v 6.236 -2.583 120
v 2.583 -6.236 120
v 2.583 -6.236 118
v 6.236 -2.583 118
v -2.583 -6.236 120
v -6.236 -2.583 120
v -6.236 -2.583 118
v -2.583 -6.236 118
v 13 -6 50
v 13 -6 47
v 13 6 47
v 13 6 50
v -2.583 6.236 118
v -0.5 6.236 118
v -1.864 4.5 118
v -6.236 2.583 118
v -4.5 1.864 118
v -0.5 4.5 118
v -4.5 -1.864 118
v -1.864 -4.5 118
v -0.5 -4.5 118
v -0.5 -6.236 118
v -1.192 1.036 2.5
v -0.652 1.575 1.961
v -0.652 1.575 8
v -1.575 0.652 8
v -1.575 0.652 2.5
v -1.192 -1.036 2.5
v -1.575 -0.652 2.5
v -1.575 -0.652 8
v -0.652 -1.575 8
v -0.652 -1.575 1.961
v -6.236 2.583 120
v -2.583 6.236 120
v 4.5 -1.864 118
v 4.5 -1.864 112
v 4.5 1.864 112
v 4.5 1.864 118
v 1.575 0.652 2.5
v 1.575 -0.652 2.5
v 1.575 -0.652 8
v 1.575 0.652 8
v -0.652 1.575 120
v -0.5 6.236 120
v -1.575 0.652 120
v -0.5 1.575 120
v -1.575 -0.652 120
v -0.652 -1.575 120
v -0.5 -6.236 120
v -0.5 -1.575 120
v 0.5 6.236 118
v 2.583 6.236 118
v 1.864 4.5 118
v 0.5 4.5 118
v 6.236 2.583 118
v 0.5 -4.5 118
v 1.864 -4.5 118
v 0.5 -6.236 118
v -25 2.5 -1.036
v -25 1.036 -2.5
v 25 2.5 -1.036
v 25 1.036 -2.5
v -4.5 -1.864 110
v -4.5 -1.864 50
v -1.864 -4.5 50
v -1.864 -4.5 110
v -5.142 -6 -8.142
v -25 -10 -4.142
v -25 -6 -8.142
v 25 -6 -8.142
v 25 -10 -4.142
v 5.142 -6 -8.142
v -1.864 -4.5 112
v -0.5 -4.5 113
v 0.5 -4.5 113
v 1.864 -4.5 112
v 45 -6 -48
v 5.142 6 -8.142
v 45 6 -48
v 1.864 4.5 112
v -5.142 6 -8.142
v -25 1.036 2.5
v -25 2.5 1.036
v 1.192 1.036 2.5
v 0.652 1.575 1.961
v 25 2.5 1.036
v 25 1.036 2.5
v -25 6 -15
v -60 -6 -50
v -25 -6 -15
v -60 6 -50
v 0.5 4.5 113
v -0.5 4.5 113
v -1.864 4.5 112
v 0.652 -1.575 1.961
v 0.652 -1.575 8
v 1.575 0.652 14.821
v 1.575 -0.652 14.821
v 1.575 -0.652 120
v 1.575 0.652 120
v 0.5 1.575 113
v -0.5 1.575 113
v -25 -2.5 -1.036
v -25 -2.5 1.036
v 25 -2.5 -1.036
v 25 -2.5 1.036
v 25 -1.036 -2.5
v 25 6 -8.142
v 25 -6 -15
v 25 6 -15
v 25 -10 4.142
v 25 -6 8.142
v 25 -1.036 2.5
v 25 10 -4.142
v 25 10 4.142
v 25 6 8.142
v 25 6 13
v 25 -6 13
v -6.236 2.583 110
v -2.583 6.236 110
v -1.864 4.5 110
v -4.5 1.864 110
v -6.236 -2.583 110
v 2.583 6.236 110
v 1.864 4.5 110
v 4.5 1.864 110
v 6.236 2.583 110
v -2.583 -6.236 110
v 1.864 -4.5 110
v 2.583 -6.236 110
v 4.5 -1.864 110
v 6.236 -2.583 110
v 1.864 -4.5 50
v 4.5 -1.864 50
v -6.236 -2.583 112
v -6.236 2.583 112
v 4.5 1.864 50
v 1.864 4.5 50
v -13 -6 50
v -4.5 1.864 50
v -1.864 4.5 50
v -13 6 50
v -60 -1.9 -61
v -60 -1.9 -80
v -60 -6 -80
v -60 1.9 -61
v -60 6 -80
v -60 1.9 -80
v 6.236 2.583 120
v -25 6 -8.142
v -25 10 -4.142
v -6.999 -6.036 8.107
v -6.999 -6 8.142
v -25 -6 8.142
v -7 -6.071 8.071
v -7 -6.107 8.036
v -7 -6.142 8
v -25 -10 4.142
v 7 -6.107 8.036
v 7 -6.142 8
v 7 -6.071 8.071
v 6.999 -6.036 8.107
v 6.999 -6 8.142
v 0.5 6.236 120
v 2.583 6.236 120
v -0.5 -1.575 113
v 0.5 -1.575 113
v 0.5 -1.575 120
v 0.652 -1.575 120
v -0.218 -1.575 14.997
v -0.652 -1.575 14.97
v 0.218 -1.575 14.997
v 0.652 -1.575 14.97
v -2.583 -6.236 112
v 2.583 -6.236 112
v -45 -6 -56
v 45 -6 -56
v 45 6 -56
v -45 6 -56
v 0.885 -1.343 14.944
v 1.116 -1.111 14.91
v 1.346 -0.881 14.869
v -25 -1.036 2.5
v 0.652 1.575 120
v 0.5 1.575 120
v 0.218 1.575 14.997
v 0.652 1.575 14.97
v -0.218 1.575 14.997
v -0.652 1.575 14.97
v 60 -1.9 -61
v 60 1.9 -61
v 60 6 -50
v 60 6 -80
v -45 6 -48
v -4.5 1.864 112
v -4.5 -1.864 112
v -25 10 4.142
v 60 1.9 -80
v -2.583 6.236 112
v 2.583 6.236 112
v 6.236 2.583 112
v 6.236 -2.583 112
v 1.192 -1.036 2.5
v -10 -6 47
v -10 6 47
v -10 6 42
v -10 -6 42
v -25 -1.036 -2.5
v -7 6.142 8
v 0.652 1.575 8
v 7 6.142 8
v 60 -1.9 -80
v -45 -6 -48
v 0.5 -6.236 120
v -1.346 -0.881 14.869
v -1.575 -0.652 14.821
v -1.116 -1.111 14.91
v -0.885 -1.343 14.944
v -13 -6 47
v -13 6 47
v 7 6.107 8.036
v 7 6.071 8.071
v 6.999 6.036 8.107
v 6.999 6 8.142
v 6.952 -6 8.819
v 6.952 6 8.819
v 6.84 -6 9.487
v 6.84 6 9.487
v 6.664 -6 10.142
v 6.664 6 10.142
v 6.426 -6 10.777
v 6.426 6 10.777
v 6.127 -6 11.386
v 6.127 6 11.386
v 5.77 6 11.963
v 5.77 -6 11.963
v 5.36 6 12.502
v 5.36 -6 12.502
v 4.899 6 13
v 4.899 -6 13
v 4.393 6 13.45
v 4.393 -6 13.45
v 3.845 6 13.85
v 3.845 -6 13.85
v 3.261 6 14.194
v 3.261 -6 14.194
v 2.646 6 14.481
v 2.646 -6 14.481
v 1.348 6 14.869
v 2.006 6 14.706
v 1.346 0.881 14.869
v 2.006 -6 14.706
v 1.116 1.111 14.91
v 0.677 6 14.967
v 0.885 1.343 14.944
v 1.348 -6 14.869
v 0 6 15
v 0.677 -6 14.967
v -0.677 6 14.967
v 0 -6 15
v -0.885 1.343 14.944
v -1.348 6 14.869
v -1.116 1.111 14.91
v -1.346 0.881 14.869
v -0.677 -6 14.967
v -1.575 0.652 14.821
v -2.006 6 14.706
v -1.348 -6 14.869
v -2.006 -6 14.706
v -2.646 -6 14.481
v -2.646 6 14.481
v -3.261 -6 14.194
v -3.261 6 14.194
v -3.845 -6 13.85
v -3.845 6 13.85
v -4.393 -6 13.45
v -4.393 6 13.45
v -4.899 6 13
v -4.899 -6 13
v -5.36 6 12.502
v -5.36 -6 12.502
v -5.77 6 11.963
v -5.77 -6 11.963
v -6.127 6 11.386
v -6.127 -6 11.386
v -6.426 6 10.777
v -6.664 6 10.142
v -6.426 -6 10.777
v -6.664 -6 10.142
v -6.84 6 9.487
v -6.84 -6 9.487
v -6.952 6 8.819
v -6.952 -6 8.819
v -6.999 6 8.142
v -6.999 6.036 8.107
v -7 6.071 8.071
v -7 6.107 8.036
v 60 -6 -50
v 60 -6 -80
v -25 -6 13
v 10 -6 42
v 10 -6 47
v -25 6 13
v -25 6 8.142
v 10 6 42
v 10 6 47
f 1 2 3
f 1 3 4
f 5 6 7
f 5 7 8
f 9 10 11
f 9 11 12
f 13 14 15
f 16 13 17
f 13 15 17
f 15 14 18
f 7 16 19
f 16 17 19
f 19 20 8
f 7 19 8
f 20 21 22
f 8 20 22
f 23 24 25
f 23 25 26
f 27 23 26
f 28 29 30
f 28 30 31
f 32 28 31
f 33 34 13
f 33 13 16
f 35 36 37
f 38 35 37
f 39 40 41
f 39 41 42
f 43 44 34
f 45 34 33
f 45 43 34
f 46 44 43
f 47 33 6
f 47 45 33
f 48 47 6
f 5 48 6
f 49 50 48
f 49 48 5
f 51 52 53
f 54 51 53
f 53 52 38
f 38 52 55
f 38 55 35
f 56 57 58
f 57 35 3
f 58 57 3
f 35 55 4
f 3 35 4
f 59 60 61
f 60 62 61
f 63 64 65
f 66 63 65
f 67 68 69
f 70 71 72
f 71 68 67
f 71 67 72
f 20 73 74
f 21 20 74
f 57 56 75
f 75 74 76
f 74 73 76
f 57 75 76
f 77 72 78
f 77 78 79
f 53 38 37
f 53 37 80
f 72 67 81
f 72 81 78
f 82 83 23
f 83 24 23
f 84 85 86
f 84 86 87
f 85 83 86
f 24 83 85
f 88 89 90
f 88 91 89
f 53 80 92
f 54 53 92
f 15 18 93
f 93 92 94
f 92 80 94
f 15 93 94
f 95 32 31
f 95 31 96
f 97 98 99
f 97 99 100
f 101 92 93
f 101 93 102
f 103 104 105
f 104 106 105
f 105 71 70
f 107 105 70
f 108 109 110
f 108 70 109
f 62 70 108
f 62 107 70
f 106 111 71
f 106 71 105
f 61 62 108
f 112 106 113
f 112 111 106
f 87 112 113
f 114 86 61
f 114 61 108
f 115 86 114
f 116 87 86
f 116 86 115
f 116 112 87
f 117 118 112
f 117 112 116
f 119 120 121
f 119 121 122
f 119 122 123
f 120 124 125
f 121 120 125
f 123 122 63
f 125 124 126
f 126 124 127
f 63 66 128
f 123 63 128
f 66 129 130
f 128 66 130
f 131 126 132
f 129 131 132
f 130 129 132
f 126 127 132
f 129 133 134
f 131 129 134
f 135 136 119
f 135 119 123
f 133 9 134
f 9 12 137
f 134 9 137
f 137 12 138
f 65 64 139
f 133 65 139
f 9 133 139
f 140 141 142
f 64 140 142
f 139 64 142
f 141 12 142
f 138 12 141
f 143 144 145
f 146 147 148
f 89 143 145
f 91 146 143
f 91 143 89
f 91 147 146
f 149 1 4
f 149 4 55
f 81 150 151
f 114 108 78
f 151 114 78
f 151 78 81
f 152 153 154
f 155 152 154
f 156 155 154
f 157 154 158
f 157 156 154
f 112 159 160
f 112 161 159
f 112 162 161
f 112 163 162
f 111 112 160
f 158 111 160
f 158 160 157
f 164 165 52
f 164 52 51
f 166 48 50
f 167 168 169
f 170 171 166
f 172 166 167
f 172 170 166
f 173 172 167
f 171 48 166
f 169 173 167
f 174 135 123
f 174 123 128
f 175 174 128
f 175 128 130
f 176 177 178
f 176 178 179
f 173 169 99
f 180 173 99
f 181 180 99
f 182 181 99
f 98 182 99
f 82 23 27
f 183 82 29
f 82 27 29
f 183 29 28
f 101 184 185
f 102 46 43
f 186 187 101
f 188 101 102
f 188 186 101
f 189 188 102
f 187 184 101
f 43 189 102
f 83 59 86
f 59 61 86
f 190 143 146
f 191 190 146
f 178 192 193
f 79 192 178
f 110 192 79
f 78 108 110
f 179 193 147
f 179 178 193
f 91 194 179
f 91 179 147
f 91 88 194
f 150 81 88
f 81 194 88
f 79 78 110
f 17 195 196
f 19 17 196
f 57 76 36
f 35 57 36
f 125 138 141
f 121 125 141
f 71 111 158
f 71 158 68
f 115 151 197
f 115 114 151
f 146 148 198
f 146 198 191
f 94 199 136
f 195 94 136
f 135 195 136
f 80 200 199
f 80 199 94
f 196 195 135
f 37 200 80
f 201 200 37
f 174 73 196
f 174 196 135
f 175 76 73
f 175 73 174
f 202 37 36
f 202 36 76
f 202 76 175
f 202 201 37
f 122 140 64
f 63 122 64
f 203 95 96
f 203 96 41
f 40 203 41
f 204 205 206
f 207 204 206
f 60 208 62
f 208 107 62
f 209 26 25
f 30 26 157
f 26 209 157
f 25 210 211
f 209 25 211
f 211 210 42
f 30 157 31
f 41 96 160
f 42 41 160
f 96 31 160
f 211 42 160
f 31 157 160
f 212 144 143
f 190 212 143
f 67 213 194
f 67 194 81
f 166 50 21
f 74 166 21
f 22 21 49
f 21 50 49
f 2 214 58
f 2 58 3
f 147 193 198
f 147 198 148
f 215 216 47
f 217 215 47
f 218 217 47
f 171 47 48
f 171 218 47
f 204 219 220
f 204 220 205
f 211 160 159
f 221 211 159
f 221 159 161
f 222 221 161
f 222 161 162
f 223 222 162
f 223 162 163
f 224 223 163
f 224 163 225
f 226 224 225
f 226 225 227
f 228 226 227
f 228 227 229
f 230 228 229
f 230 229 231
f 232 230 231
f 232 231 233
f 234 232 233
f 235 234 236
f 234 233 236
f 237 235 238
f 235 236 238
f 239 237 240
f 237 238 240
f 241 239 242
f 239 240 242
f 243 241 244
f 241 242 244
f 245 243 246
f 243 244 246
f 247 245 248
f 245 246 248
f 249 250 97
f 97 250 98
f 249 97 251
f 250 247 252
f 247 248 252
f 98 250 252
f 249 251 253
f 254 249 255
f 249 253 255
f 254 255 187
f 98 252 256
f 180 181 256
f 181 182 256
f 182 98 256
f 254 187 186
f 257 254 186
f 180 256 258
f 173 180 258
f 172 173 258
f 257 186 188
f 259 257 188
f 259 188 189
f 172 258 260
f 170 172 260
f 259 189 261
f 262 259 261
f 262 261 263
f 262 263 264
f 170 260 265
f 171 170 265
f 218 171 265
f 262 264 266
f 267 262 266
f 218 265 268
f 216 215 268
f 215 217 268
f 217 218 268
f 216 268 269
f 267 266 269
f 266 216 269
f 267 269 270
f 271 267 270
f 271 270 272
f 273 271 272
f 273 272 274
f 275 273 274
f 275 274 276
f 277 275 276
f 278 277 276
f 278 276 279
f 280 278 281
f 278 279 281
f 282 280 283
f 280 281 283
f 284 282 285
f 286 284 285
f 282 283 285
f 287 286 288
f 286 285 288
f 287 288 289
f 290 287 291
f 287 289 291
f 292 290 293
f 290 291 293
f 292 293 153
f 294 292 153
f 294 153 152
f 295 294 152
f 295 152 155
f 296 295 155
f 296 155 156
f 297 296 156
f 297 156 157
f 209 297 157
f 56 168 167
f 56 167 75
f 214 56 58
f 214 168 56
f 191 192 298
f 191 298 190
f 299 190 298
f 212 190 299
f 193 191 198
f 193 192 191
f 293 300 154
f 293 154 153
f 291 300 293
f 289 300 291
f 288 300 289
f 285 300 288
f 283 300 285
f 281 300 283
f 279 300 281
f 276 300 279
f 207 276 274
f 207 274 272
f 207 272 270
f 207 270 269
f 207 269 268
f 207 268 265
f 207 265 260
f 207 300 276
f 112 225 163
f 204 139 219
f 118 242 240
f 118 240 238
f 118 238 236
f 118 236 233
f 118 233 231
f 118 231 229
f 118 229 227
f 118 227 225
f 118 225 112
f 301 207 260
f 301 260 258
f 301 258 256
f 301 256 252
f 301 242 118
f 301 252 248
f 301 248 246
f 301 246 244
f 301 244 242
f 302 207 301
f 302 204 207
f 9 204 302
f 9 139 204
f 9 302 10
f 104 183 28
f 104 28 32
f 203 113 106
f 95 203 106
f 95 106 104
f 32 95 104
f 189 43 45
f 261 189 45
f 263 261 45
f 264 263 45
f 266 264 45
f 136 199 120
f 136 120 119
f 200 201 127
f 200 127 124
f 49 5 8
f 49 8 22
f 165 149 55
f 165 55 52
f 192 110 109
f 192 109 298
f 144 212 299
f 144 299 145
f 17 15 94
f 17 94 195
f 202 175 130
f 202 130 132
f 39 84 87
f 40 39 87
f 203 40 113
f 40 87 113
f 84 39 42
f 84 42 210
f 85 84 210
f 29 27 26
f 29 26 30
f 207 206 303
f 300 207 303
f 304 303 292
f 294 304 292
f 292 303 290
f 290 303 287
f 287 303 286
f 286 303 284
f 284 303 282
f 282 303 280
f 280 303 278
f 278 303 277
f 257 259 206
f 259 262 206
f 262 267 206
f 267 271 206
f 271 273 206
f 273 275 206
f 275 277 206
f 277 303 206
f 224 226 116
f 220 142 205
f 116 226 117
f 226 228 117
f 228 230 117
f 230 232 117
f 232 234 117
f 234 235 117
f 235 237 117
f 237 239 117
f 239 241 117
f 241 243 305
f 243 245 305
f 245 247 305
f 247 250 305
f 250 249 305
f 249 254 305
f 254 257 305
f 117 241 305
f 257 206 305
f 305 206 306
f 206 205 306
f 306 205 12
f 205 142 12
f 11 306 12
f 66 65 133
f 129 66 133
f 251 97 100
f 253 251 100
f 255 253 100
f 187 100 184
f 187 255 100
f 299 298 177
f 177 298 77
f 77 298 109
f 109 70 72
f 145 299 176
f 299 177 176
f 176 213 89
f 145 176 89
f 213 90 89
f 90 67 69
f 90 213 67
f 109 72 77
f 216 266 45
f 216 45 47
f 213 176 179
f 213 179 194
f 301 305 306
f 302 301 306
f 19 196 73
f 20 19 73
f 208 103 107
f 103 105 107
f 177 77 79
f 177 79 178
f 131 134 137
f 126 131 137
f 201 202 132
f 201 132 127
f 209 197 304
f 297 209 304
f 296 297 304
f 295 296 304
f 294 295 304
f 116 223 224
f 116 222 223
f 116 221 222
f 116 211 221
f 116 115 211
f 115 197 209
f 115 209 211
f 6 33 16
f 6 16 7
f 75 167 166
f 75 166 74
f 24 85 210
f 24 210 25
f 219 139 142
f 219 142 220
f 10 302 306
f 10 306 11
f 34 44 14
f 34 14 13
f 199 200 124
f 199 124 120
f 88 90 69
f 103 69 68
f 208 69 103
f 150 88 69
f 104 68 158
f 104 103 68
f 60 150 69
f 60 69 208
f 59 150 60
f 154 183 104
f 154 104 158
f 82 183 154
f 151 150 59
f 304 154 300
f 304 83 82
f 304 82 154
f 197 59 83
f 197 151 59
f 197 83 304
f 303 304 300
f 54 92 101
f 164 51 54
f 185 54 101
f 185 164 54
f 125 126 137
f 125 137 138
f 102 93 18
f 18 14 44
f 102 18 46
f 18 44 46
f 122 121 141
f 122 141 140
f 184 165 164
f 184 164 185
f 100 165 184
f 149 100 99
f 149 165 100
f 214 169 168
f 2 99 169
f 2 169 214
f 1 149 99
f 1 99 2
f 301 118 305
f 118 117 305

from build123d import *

# Parameters (mm, degrees)
PAD_DEPTH            = 25
PAD_DEPTH_BACK       = 25
PAD001_START         = 5
PAD001_DEPTH         = 115
PAD002_DEPTH         = 6
PAD002_DEPTH_BACK    = 6
POCKET_DEPTH         = 10.001
POCKET_DEPTH_BACK    = 10.001
POCKET001_DEPTH      = 120.001
PAD003_DEPTH         = 2
LINEARPATTERN_COUNT  = 2
LINEARPATTERN_PITCH  = 8
SKETCH006_W          = 15
SKETCH006_H          = 1
POCKET002_DEPTH      = 7
PAD004_DEPTH         = 6
PAD004_DEPTH_BACK    = 6
SKETCH008_W          = 3.8
SKETCH008_H          = 20
POCKET003_DEPTH      = 60.001
POCKET003_DEPTH_BACK = 60.001
POCKET004_DEPTH      = 10.001
POCKET004_DEPTH_BACK = 10.001


with BuildPart() as part:
    # Sketch → Pad (new body, two sides)
    with BuildSketch(Plane.YZ) as pad_sk:
        Polygon((10, -4.142136), (10, 4.142136), (4.142136, 10), (-4.142136, 10), (-10, 4.142136), (-10, -4.142136), (-4.142136, -10), (4.142136, -10), align=None)
        Polygon((2.5, 1.035534), (1.035534, 2.5), (-1.035534, 2.5), (-2.5, 1.035534), (-2.5, -1.035534), (-1.035534, -2.5), (1.035534, -2.5), (2.5, -1.035534), align=None, mode=Mode.SUBTRACT)
    extrude(amount=PAD_DEPTH)
    extrude(pad_sk.sketch, amount=-PAD_DEPTH_BACK)

    # Sketch001 → Pad001 (join)
    with BuildSketch(Plane.XY.offset(PAD001_START)):
        Polygon((4.5, -1.863961), (4.5, 1.863961), (1.863961, 4.5), (-1.863961, 4.5), (-4.5, 1.863961), (-4.5, -1.863961), (-1.863961, -4.5), (1.863961, -4.5), align=None)
        Polygon((1.575, -0.652386), (1.575, 0.652386), (0.652386, 1.575), (-0.652386, 1.575), (-1.575, 0.652386), (-1.575, -0.652386), (-0.652386, -1.575), (0.652386, -1.575), align=None, mode=Mode.SUBTRACT)
    extrude(amount=PAD001_DEPTH)

    # Sketch002 → Pad002 (join, two sides)
    with BuildSketch(Plane.XZ) as pad002_sk:
        Polygon((-25, 8), (25, 8), (25, 13), (10, 42), (10, 47), (13, 47), (13, 50), (-13, 50), (-13, 47), (-10, 47), (-10, 42), (-25, 13), align=None)
    extrude(amount=PAD002_DEPTH)
    extrude(pad002_sk.sketch, amount=-PAD002_DEPTH_BACK)

    # Sketch003 → Pocket (cut, two sides)
    with BuildSketch(Plane.XZ) as pocket_sk:
        with BuildLine():
            ThreePointArc((7, 8), (0, 15), (-7, 8))
            Line((-7, 8), (7, 8))
        make_face()
    extrude(amount=-POCKET_DEPTH, mode=Mode.SUBTRACT)
    extrude(pocket_sk.sketch, amount=POCKET_DEPTH_BACK, mode=Mode.SUBTRACT)

    # Sketch004 → Pocket001 (cut, through all)
    with BuildSketch(Plane.XY):
        Polygon((1.575, -0.652386), (1.575, 0.652386), (0.652386, 1.575), (-0.652386, 1.575), (-1.575, 0.652386), (-1.575, -0.652386), (-0.652386, -1.575), (0.652386, -1.575), align=None)
    extrude(amount=POCKET001_DEPTH, mode=Mode.SUBTRACT)

    # Sketch005 (on Face68 of Pocket001) → Pad003 (join)
    with BuildSketch(Plane(origin=(0, 0, 120), x_dir=(0, -1, 0), z_dir=(0, 0, 1))):
        Polygon((6.236187, -2.583113), (6.236187, 2.583113), (2.583113, 6.236187), (-2.583113, 6.236187), (-6.236187, 2.583113), (-6.236187, -2.583113), (-2.583113, -6.236187), (2.583113, -6.236187), align=None)
        Polygon((1.339392, -3.233578), (3.233578, -1.339392), (3.233578, 1.339392), (1.339392, 3.233578), (-1.339392, 3.233578), (-3.233578, 1.339392), (-3.233578, -1.339392), (-1.339392, -3.233578), align=None, mode=Mode.SUBTRACT)
    pad003 = extrude(amount=-PAD003_DEPTH)

    # LinearPattern: Pad003 ×2
    with Locations(*[(0, 0, -i * LINEARPATTERN_PITCH) for i in range(1, LINEARPATTERN_COUNT)]):
        add(pad003)

    # Sketch006 (on Face80 of LinearPattern) → Pocket002 (cut)
    with BuildSketch(Plane(origin=(0, 0, 120), x_dir=(0, -1, 0), z_dir=(0, 0, 1))):
        Rectangle(SKETCH006_W, SKETCH006_H)
    extrude(amount=-POCKET002_DEPTH, mode=Mode.SUBTRACT)

    # Sketch007 → Pad004 (join, two sides)
    with BuildSketch(Plane.XZ) as pad004_sk:
        Polygon((-25, -5), (25, -5), (25, -15), (60, -50), (60, -80), (-60, -80), (-60, -50), (-25, -15), align=None)
    extrude(amount=PAD004_DEPTH)
    extrude(pad004_sk.sketch, amount=-PAD004_DEPTH_BACK)

    # Sketch008 → Pocket003 (cut, two sides)
    with BuildSketch(Plane.YZ) as pocket003_sk:
        with Locations((0, -71)):
            Rectangle(SKETCH008_W, SKETCH008_H)
    extrude(amount=-POCKET003_DEPTH, mode=Mode.SUBTRACT)
    extrude(pocket003_sk.sketch, amount=POCKET003_DEPTH_BACK, mode=Mode.SUBTRACT)

    # Sketch009 → Pocket004 (cut, two sides)
    with BuildSketch(Plane.XZ) as pocket004_sk:
        Polygon((-5.142136, -8.142136), (5.142136, -8.142136), (45, -48), (45, -56), (-45, -56), (-45, -48), align=None)
    extrude(amount=-POCKET004_DEPTH, mode=Mode.SUBTRACT)
    extrude(pocket004_sk.sketch, amount=POCKET004_DEPTH_BACK, mode=Mode.SUBTRACT)


solid = part.part
